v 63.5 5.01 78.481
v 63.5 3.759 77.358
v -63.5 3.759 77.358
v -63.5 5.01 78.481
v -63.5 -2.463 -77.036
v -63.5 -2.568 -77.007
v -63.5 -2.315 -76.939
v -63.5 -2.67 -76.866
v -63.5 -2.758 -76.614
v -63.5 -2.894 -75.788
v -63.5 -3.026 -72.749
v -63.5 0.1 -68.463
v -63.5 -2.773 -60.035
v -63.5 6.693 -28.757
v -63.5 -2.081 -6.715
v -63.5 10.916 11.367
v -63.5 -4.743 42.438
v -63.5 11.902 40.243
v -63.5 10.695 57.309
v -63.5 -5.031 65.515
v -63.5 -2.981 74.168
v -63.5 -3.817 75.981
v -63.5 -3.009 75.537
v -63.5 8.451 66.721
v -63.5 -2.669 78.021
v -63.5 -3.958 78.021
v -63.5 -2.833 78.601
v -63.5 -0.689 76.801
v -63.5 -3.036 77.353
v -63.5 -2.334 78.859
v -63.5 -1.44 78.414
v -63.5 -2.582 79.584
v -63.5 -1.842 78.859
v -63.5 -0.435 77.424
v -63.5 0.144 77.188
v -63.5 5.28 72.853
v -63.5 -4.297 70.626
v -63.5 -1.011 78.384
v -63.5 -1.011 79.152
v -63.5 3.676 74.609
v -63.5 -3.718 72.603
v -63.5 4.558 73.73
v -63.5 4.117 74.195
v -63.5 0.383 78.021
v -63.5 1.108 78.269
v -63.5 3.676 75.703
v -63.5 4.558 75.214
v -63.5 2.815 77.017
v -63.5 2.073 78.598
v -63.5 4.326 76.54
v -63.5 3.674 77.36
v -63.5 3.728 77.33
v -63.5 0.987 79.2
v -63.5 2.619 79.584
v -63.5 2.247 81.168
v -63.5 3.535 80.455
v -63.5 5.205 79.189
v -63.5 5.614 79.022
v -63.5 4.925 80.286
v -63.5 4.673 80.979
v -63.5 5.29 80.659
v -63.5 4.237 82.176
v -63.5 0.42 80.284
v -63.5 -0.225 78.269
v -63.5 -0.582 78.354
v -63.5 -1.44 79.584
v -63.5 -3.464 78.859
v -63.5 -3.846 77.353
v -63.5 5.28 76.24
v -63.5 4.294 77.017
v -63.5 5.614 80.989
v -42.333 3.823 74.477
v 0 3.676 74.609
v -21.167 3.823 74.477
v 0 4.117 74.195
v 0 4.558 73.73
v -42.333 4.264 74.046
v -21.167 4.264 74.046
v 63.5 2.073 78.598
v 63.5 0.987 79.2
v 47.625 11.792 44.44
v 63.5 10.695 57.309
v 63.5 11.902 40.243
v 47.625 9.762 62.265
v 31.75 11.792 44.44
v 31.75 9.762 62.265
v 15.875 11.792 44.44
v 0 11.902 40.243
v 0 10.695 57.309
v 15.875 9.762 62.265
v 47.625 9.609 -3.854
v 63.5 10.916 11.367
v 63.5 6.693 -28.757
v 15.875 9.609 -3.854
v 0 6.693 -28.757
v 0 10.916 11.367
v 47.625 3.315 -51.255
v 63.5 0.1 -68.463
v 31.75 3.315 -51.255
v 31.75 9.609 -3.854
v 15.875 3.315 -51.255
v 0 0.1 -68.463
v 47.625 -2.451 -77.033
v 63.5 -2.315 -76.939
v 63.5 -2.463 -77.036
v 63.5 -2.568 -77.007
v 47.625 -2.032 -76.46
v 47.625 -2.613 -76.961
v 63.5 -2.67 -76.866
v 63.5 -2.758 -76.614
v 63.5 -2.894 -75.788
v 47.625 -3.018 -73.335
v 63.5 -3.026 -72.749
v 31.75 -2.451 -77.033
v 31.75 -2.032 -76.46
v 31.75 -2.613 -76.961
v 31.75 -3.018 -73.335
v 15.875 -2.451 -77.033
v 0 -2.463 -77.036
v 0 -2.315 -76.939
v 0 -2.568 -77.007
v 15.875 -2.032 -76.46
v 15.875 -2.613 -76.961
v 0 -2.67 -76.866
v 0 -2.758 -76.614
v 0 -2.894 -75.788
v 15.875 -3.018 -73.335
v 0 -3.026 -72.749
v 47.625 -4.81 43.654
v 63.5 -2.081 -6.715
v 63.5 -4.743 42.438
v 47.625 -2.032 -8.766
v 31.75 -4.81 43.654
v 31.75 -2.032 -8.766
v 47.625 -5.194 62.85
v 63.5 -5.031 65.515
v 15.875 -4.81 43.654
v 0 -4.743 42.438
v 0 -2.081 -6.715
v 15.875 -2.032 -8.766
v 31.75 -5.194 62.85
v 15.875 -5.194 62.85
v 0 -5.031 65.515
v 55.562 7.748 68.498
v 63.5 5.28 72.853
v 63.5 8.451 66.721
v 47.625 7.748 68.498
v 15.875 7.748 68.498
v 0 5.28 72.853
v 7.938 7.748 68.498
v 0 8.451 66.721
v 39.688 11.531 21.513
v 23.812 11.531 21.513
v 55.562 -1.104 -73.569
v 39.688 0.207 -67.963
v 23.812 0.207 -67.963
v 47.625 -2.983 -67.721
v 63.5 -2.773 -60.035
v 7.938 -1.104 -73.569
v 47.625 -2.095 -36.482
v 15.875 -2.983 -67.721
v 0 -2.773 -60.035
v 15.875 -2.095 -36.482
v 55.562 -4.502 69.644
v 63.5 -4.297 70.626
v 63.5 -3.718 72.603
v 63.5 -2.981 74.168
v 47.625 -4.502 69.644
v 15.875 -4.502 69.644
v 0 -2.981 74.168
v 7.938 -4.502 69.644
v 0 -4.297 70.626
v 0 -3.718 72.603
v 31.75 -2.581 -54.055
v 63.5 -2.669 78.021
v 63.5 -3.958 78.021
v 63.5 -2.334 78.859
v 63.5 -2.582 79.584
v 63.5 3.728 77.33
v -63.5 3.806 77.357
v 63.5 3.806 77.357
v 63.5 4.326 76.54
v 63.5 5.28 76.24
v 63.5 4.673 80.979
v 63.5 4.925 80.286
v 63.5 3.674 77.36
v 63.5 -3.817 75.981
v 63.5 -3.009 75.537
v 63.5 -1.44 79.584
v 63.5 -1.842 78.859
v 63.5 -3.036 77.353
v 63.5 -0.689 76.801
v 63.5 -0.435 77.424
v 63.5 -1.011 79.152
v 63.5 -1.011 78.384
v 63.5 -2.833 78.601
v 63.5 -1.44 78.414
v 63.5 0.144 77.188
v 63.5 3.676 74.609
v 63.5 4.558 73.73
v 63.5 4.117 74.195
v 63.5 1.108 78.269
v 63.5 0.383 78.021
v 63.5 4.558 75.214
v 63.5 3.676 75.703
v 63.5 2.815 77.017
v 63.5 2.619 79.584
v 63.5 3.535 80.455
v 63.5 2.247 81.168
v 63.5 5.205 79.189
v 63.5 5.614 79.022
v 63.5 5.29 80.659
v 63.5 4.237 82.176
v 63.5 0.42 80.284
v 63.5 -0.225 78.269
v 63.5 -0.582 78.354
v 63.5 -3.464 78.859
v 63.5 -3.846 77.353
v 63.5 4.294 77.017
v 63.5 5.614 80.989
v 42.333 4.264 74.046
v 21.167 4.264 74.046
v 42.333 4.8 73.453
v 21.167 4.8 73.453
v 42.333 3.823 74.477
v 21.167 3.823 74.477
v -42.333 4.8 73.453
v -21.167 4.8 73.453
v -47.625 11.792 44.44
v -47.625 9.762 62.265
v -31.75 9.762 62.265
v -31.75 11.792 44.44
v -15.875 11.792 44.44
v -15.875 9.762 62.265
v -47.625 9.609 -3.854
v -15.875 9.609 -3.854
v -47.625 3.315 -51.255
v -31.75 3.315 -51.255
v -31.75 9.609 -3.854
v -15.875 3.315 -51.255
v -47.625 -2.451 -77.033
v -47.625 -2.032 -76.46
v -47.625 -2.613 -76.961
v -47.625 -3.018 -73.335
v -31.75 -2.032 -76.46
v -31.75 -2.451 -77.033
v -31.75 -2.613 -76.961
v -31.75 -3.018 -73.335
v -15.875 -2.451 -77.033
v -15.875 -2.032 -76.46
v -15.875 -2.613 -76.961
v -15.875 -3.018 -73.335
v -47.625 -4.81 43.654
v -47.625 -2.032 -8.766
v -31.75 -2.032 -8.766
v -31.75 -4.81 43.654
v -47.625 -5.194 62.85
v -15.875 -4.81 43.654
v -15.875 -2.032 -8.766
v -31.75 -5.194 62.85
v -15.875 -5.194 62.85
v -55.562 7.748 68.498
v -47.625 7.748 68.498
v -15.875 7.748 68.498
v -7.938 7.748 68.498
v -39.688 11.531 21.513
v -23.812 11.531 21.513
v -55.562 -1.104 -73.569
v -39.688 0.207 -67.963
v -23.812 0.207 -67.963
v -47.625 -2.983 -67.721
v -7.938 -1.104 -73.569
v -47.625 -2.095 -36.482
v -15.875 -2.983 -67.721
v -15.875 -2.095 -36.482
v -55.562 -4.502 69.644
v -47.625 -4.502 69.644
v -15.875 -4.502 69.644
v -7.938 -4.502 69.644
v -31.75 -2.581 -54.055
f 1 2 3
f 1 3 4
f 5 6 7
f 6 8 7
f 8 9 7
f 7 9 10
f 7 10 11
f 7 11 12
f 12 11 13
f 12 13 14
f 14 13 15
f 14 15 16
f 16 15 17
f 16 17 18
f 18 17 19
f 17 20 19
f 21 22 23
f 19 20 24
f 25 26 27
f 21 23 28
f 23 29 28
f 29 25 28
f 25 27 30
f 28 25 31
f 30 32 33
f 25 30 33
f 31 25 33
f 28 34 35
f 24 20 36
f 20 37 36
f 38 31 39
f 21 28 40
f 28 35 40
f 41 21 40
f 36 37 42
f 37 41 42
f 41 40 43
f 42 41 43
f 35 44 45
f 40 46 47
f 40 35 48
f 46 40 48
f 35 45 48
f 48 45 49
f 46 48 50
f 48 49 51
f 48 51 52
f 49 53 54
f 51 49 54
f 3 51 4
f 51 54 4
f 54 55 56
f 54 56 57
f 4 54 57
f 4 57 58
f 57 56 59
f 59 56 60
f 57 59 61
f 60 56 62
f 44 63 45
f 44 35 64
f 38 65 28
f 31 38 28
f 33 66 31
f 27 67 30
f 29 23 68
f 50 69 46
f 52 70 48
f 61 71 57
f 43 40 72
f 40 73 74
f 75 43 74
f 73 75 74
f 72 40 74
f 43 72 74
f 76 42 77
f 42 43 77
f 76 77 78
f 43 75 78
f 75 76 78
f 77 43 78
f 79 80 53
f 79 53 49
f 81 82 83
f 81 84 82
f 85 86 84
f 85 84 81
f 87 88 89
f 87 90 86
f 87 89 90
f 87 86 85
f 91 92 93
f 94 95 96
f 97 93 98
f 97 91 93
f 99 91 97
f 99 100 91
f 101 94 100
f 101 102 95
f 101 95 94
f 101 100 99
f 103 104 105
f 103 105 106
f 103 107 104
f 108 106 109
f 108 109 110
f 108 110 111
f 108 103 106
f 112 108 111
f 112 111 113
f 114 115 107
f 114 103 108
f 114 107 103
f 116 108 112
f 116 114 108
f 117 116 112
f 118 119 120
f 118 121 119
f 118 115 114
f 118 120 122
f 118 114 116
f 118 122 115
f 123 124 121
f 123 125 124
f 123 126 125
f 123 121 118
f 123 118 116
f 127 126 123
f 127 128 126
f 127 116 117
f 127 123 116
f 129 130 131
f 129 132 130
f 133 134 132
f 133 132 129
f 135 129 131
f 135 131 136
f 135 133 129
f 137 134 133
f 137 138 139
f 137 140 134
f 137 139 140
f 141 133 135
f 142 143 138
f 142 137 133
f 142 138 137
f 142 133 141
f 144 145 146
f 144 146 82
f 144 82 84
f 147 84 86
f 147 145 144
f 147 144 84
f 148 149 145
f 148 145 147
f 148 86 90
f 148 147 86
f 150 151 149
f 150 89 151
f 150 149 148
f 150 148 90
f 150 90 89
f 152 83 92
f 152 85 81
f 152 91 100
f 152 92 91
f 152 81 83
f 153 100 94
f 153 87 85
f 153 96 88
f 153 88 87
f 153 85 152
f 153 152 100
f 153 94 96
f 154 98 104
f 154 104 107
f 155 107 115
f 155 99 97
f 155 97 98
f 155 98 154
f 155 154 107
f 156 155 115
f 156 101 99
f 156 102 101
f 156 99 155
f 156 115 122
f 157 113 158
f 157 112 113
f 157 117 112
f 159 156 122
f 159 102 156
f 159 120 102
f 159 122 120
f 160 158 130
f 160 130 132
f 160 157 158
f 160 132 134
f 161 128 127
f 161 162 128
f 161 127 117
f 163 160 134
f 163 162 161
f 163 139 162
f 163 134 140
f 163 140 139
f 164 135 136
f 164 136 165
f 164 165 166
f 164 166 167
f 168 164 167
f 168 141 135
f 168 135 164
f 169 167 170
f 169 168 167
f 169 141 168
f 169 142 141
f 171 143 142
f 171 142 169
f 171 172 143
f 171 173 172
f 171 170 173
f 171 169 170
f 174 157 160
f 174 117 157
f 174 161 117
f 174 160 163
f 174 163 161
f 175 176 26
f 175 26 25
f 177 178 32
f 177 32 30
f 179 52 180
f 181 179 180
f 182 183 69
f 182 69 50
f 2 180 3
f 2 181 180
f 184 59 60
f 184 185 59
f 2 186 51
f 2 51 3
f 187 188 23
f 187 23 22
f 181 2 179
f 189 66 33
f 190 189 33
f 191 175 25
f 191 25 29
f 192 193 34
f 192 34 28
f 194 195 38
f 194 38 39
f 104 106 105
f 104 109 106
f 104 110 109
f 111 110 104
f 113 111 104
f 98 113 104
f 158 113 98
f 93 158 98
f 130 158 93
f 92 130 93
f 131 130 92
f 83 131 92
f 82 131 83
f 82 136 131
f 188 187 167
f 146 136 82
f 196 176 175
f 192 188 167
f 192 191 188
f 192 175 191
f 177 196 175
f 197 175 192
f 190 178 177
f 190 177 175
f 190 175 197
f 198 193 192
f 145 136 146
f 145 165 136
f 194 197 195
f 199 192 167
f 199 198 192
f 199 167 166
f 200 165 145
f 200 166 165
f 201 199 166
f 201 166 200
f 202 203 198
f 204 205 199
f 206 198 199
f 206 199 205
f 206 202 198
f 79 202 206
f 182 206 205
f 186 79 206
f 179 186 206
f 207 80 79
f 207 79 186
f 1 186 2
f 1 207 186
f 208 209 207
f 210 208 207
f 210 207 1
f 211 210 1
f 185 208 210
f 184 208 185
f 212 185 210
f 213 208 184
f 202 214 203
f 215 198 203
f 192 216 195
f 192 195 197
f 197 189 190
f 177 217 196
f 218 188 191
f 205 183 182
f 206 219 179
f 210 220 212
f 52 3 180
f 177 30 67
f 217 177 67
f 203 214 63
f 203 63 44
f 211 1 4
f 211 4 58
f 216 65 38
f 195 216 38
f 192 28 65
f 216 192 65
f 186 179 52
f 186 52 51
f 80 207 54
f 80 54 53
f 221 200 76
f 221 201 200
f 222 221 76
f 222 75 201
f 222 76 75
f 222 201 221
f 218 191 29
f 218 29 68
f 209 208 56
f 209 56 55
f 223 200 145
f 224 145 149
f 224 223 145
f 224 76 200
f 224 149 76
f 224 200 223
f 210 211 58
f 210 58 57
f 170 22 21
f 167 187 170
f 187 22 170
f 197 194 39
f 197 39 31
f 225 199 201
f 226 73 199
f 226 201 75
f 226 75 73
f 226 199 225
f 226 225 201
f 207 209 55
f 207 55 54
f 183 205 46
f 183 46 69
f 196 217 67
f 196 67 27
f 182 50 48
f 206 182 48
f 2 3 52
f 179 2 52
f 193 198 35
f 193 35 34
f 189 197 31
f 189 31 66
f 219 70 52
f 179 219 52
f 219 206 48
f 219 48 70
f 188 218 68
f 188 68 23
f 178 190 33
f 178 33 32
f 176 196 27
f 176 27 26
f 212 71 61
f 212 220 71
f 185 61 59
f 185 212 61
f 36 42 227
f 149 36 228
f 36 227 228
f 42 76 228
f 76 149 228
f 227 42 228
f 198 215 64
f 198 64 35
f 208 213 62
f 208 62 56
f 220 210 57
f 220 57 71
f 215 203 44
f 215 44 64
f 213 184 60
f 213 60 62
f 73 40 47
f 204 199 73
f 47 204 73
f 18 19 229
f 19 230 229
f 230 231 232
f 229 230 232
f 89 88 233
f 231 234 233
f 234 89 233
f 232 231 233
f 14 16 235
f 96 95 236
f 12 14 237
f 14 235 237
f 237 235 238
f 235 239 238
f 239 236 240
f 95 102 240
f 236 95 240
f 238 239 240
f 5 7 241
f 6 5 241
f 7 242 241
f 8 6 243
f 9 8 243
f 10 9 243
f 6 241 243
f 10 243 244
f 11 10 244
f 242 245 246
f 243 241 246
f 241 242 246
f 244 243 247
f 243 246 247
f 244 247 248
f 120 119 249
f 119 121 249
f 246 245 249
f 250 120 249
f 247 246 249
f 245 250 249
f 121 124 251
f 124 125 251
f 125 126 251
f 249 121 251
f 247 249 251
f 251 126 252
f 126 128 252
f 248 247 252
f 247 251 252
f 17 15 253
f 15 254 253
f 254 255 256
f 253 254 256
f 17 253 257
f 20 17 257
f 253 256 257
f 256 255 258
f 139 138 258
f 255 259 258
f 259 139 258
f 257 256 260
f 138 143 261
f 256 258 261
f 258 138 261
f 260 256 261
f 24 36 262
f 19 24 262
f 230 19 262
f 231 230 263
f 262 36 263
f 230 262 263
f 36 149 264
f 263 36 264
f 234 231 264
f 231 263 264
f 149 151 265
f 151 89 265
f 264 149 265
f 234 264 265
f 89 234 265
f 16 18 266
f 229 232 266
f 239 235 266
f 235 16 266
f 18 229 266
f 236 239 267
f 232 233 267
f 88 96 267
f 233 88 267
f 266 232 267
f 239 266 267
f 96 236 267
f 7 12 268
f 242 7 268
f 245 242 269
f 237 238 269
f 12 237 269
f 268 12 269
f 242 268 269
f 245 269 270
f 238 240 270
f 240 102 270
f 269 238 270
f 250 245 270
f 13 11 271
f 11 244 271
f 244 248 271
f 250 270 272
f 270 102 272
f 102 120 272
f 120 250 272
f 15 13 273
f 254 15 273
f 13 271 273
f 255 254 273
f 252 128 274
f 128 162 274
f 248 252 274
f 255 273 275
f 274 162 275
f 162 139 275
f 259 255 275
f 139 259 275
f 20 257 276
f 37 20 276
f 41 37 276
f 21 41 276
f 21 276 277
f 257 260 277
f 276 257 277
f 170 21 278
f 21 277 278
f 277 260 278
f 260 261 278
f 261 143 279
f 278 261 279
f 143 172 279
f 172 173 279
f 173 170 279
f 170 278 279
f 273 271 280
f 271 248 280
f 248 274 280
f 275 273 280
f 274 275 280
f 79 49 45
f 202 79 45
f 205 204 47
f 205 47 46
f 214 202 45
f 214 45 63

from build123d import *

# Parameters (mm, degrees)
F1_DEPTH = 63.5


with BuildPart() as f1:
    # F0 (on Right) → F1 (new body, symmetric)
    with BuildSketch(Plane.YZ):
        with BuildLine():
            add(Edge.make_bspline(
                [(-2.5031952433, 74.8461923193), (-2.3533415993, 75.0276387666), (-2.1963644561, 75.1912104401), (-2.0320170307, 75.336497153)],
                knots=[0.9934294222, 0.9934294222, 0.9934294222, 0.9934294222, 1, 1, 1, 1], degree=3))
            add(Edge.make_bspline(
                [(-2.0320170307, 75.336497153), (-1.8891955809, 75.4627544334), (-1.7408081058, 75.5752029408), (-1.5873915563, 75.6737167739)],
                knots=[0, 0, 0, 0, 0.0057099735, 0.0057099735, 0.0057099735, 0.0057099735], degree=3))
            Line((-1.5873915563, 75.6737167739), (-2.3197238782, 75.9019267209))
            Line((-2.3197238782, 75.9019267209), (-3.0087709391, 75.537379435))
            Line((-3.0087709391, 75.537379435), (-3.3884674872, 75.336497153))
            Line((-3.3884674872, 75.336497153), (-2.5031952433, 74.8461923193))
        make_face()
        with BuildLine():
            add(Edge.make_bspline(
                [(-2.0320170307, 75.336497153), (-1.8891955809, 75.4627544334), (-1.7408081058, 75.5752029408), (-1.5873915563, 75.6737167739)],
                knots=[0, 0, 0, 0, 0.0057099735, 0.0057099735, 0.0057099735, 0.0057099735], degree=3))
            add(Edge.make_bspline(
                [(-2.5031952433, 74.8461923193), (-2.3533415993, 75.0276387666), (-2.1963644561, 75.1912104401), (-2.0320170307, 75.336497153)],
                knots=[0.9934294222, 0.9934294222, 0.9934294222, 0.9934294222, 1, 1, 1, 1], degree=3))
            Line((-2.5031952433, 74.8461923193), (-2.981348253, 74.1680218189))
            add(Edge.make_bspline(
                [(5.280060228, 72.8526241439), (7.0114055785, 70.5658194338), (19.9534117553, 42.5855454276), (-9.4568688164, -135.9427321675), (2.3047634441, -4.9873481871), (-8.3046344498, 65.3969700213), (-2.981348253, 74.1680218189)],
                knots=[0.0751955785, 0.0751955785, 0.0751955785, 0.0751955785, 0.1255570674, 0.4789595318, 0.7253581944, 0.9860523361, 0.9860523361, 0.9860523361, 0.9860523361], degree=3))
            add(Edge.make_bspline(
                [(4.558134096, 73.7302112384), (4.8003585227, 73.4604084562), (5.0413225391, 73.1679549189), (5.280060228, 72.8526241439)],
                knots=[0.0682511607, 0.0682511607, 0.0682511607, 0.0682511607, 0.0751955785, 0.0751955785, 0.0751955785, 0.0751955785], degree=3))
            add(Edge.make_bspline(
                [(4.1172295334, 74.1951779468), (4.264516573, 74.048449974), (4.4115561068, 73.8934778), (4.558134096, 73.7302112384)],
                knots=[0.0640488644, 0.0640488644, 0.0640488644, 0.0640488644, 0.0682511607, 0.0682511607, 0.0682511607, 0.0682511607], degree=3))
            add(Edge.make_bspline(
                [(3.6763249708, 74.609368014), (3.8233977451, 74.4794605202), (3.9704365633, 74.3414137255), (4.1172295334, 74.1951779468)],
                knots=[0.0598606647, 0.0598606647, 0.0598606647, 0.0598606647, 0.0640488644, 0.0640488644, 0.0640488644, 0.0640488644], degree=3))
            add(Edge.make_bspline(
                [(2.0872520516, 75.7028253852), (2.6106797609, 75.4435060137), (3.1437250175, 75.0798067166), (3.6763249708, 74.609368014)],
                knots=[0.0446937854, 0.0446937854, 0.0446937854, 0.0446937854, 0.0598606647, 0.0598606647, 0.0598606647, 0.0598606647], degree=3))
            Line((2.0872520516, 75.7028253852), (0.9867487565, 76.098998544))
            add(Edge.make_bspline(
                [(-0.3830142642, 76.1440130478), (0.0531822749, 76.2183929611), (0.5125534467, 76.2040407853), (0.9867487565, 76.098998544)],
                knots=[0.0196351754, 0.0196351754, 0.0196351754, 0.0196351754, 0.0338877489, 0.0338877489, 0.0338877489, 0.0338877489], degree=3))
            Line((-0.3830142642, 76.1440130478), (-1.5873915563, 75.6737167739))
        make_face()
        with BuildLine():
            Line((-2.2569033628, 77.1257479092), (-1.5873915563, 75.6737167739))
            add(Edge.make_bspline(
                [(-1.5873915563, 75.6737167739), (-1.2132468387, 75.9139674535), (-0.8091916762, 76.0713415886), (-0.3830142642, 76.1440130478)],
                knots=[0.0057099735, 0.0057099735, 0.0057099735, 0.0057099735, 0.0196351754, 0.0196351754, 0.0196351754, 0.0196351754], degree=3))
            Line((-0.3830142642, 76.1440130478), (-0.6890374261, 76.8008807945))
            Line((-0.6890374261, 76.8008807945), (-1.4403613131, 78.4135705847))
            Line((-1.4403613131, 78.4135705847), (-1.6477123366, 78.8586421238))
            Line((-1.6477123366, 78.8586421238), (-2.2407262096, 78.5852114929))
            Line((-2.2407262096, 78.5852114929), (-2.1511793417, 78.3231779933))
            Line((-2.1511793417, 78.3231779933), (-2.5002173073, 78.4655636773))
            Line((-2.5002173073, 78.4655636773), (-2.8090220876, 78.3231779933))
            Line((-2.8090220876, 78.3231779933), (-2.6694845793, 78.0205503106))
            Line((-2.6694845793, 78.0205503106), (-2.2899973688, 77.1975218893))
            Line((-2.2899973688, 77.1975218893), (-2.1982068219, 77.239845262))
            Line((-2.1982068219, 77.239845262), (-2.2569033628, 77.1257479092))
        make_face()
        Polygon((-2.3197238782, 75.9019267209), (-1.5873915563, 75.6737167739), (-2.2569033628, 77.1257479092), (-2.8081836648, 76.0541409256), align=None)
        with BuildLine():
            add(Edge.make_bspline(
                [(-1.5873915563, 75.6737167739), (-1.2132468387, 75.9139674535), (-0.8091916762, 76.0713415886), (-0.3830142642, 76.1440130478)],
                knots=[0.0057099735, 0.0057099735, 0.0057099735, 0.0057099735, 0.0196351754, 0.0196351754, 0.0196351754, 0.0196351754], degree=3))
            Line((-1.5873915563, 75.6737167739), (-0.3830142642, 76.1440130478))
        make_face()
        with BuildLine():
            Line((-2.981348253, 74.1680218189), (-2.5031952433, 74.8461923193))
            add(Edge.make_bspline(
                [(-2.981348253, 74.1680218189), (-2.8307106495, 74.416223808), (-2.6714427358, 74.6424741518), (-2.5031952433, 74.8461923193)],
                knots=[0.9860523361, 0.9860523361, 0.9860523361, 0.9860523361, 0.9934294222, 0.9934294222, 0.9934294222, 0.9934294222], degree=3))
        make_face()
        with BuildLine():
            add(Edge.make_bspline(
                [(-2.981348253, 74.1680218189), (-2.8307106495, 74.416223808), (-2.6714427358, 74.6424741518), (-2.5031952433, 74.8461923193)],
                knots=[0.9860523361, 0.9860523361, 0.9860523361, 0.9860523361, 0.9934294222, 0.9934294222, 0.9934294222, 0.9934294222], degree=3))
            Line((-2.5031952433, 74.8461923193), (-3.3884674872, 75.336497153))
            Line((-3.3884674872, 75.336497153), (-3.0087709391, 75.537379435))
            Line((-3.0087709391, 75.537379435), (-3.817089441, 75.9805697295))
            Line((-3.817089441, 75.9805697295), (-2.981348253, 74.1680218189))
        make_face()
        with BuildLine():
            Line((-0.6890374261, 76.8008807945), (-0.3830142642, 76.1440130478))
            add(Edge.make_bspline(
                [(-0.3830142642, 76.1440130478), (0.0531822749, 76.2183929611), (0.5125534467, 76.2040407853), (0.9867487565, 76.098998544)],
                knots=[0.0196351754, 0.0196351754, 0.0196351754, 0.0196351754, 0.0338877489, 0.0338877489, 0.0338877489, 0.0338877489], degree=3))
            Line((0.9867487565, 76.098998544), (0.7385915378, 76.1883333325))
            Line((0.7385915378, 76.1883333325), (2.0733734483, 78.5983552125))
            Line((2.0733734483, 78.5983552125), (1.1083647041, 78.2685748189))
            Line((1.1083647041, 78.2685748189), (0.3825913591, 78.0205503106))
            Line((0.3825913591, 78.0205503106), (-0.2254049465, 78.2685748189))
            Line((-0.2254049465, 78.2685748189), (0.1438712369, 77.187992853))
            Line((0.1438712369, 77.187992853), (-0.4348183983, 77.4240620708))
            Line((-0.4348183983, 77.4240620708), (-0.6890374261, 76.8008807945))
        make_face()
        Polygon((-2.8081836648, 76.0541409256), (-2.2569033628, 77.1257479092), (-2.2899973688, 77.1975218893), (-3.4018163569, 76.6848772764), (-3.0356504681, 77.3527137935), (-3.8457969204, 77.3527137935), (-3.0087709391, 75.537379435), (-2.3197238782, 75.9019267209), align=None)
        Polygon((-2.2899973688, 77.1975218893), (-2.2569033628, 77.1257479092), (-2.1982068219, 77.239845262), align=None)
        with BuildLine():
            Line((0.7385915378, 76.1883333325), (0.9867487565, 76.098998544))
            add(Edge.make_bspline(
                [(0.9867487565, 76.098998544), (1.3462748329, 76.0193574676), (1.7143224031, 75.8875841978), (2.0872520516, 75.7028253852)],
                knots=[0.0338877489, 0.0338877489, 0.0338877489, 0.0338877489, 0.0446937854, 0.0446937854, 0.0446937854, 0.0446937854], degree=3))
            Line((2.0872520516, 75.7028253852), (2.8149356255, 77.0166979519))
            Line((2.8149356255, 77.0166979519), (3.1620607729, 77.6434514267))
            Line((3.1620607729, 77.6434514267), (4.059301739, 79.2634691559))
            Line((4.059301739, 79.2634691559), (4.2368694943, 79.5840774682))
            Line((4.2368694943, 79.5840774682), (2.9990179464, 80.2696570754))
            Line((2.9990179464, 80.2696570754), (2.619312158, 79.5840774682))
            Line((2.619312158, 79.5840774682), (2.0733734483, 78.5983552125))
            Line((2.0733734483, 78.5983552125), (0.7385915378, 76.1883333325))
        make_face()
        with BuildLine():
            add(Edge.make_bspline(
                [(0.9867487565, 76.098998544), (1.3462748329, 76.0193574676), (1.7143224031, 75.8875841978), (2.0872520516, 75.7028253852)],
                knots=[0.0338877489, 0.0338877489, 0.0338877489, 0.0338877489, 0.0446937854, 0.0446937854, 0.0446937854, 0.0446937854], degree=3))
            Line((0.9867487565, 76.098998544), (2.0872520516, 75.7028253852))
        make_face()
        Polygon((-1.4403613131, 78.4135705847), (-0.6890374261, 76.8008807945), (-0.5820615334, 78.3544704318), (-1.0112114232, 78.3840205083), align=None)
        Polygon((-3.4018163569, 76.6848772764), (-2.2899973688, 77.1975218893), (-2.6694845793, 78.0205503106), (-3.0356504681, 77.3527137935), align=None)
        with BuildLine():
            Line((3.6763249708, 76.1440130478), (2.0872520516, 75.7028253852))
            add(Edge.make_bspline(
                [(2.0872520516, 75.7028253852), (2.6106797609, 75.4435060137), (3.1437250175, 75.0798067166), (3.6763249708, 74.609368014)],
                knots=[0.0446937854, 0.0446937854, 0.0446937854, 0.0446937854, 0.0598606647, 0.0598606647, 0.0598606647, 0.0598606647], degree=3))
            Line((3.6763249708, 74.609368014), (3.6763249708, 75.7028253852))
            Line((3.6763249708, 75.7028253852), (3.6763249708, 76.1440130478))
        make_face()
        Polygon((2.8149356255, 77.0166979519), (2.0872520516, 75.7028253852), (3.6763249708, 76.1440130478), (3.6763249708, 75.7028253852), (5.280060228, 76.2396529317), (4.3258606793, 76.5404312399), align=None)
        Polygon((-1.0112114232, 79.1521631181), (-1.4403613131, 78.4135705847), (-1.0112114232, 78.3840205083), align=None)
        Polygon((-1.6477123366, 78.8586421238), (-1.4403613131, 78.4135705847), (-1.4403613131, 79.5840774682), (-1.8421410574, 78.8586421238), (-2.5820769138, 79.5840774682), (-2.3341679132, 78.8586421238), (-2.2407262096, 78.5852114929), align=None)
        Polygon((-3.9583467878, 78.0205503106), (-2.6694845793, 78.0205503106), (-2.8090220876, 78.3231779933), (-2.5002173073, 78.4655636773), (-2.832915338, 78.6012836886), align=None)
        Polygon((3.6763249708, 75.7028253852), (3.6763249708, 74.609368014), (4.558134096, 75.2144385873), align=None)
        Polygon((3.1620607729, 77.6434514267), (2.8149356255, 77.0166979519), (4.2936985152, 77.0166979519), (3.7278796441, 77.3300746893), (3.6735305559, 77.3601757354), align=None)
        Polygon((0.9867440243, 79.2001809928), (2.0733734483, 78.5983552125), (2.619312158, 79.5840774682), align=None)
        Polygon((4.059301739, 79.2634691559), (3.1620607729, 77.6434514267), (3.6735305559, 77.3601757354), (3.7591097802, 77.3580947163), (5.0101839906, 78.4805724743), align=None)
        Polygon((2.2468396386, 81.1680637901), (2.619312158, 79.5840774682), (2.9990179464, 80.2696570754), (4.2368694943, 79.5840774682), (4.9254237576, 80.2863950385), (4.6729080744, 80.9793676024), (4.2368694943, 82.1759775281), (3.534725517, 80.4547728496), align=None)
        Polygon((0.3825913591, 78.0205503106), (1.1083647041, 78.2685748189), (0.4196934169, 80.2837759256), align=None)
        Polygon((-2.1511793417, 78.3231779933), (-2.2407262096, 78.5852114929), (-2.5002173073, 78.4655636773), align=None)
        Polygon((-2.5002173073, 78.4655636773), (-2.2407262096, 78.5852114929), (-2.3341679132, 78.8586421238), (-2.832915338, 78.6012836886), align=None)
        Polygon((-3.4637924188, 78.8586421238), (-2.832915338, 78.6012836886), (-2.3341679132, 78.8586421238), align=None)
        Polygon((4.2368694943, 79.5840774682), (4.059301739, 79.2634691559), (5.0101839906, 78.4805724743), (5.6139780208, 79.0223032236), (5.2050605226, 79.1891160159), align=None)
        Polygon((4.9254237576, 80.2863950385), (4.2368694943, 79.5840774682), (5.2050605226, 79.1891160159), (5.6139780208, 80.9887126088), (5.2903378525, 80.6586032931), align=None)
    extrude(amount=F1_DEPTH, both=True)


with BuildPart() as f1b:
    # F0 (on Right) → F1, piece 2 (new body, symmetric)
    with BuildSketch(Plane.YZ):
        Polygon((3.7591097802, 77.3580947163), (3.7278796441, 77.3300746893), (3.8055084945, 77.3569664447), align=None)
    extrude(amount=F1_DEPTH, both=True)


solid = Compound([f1.part, f1b.part])
